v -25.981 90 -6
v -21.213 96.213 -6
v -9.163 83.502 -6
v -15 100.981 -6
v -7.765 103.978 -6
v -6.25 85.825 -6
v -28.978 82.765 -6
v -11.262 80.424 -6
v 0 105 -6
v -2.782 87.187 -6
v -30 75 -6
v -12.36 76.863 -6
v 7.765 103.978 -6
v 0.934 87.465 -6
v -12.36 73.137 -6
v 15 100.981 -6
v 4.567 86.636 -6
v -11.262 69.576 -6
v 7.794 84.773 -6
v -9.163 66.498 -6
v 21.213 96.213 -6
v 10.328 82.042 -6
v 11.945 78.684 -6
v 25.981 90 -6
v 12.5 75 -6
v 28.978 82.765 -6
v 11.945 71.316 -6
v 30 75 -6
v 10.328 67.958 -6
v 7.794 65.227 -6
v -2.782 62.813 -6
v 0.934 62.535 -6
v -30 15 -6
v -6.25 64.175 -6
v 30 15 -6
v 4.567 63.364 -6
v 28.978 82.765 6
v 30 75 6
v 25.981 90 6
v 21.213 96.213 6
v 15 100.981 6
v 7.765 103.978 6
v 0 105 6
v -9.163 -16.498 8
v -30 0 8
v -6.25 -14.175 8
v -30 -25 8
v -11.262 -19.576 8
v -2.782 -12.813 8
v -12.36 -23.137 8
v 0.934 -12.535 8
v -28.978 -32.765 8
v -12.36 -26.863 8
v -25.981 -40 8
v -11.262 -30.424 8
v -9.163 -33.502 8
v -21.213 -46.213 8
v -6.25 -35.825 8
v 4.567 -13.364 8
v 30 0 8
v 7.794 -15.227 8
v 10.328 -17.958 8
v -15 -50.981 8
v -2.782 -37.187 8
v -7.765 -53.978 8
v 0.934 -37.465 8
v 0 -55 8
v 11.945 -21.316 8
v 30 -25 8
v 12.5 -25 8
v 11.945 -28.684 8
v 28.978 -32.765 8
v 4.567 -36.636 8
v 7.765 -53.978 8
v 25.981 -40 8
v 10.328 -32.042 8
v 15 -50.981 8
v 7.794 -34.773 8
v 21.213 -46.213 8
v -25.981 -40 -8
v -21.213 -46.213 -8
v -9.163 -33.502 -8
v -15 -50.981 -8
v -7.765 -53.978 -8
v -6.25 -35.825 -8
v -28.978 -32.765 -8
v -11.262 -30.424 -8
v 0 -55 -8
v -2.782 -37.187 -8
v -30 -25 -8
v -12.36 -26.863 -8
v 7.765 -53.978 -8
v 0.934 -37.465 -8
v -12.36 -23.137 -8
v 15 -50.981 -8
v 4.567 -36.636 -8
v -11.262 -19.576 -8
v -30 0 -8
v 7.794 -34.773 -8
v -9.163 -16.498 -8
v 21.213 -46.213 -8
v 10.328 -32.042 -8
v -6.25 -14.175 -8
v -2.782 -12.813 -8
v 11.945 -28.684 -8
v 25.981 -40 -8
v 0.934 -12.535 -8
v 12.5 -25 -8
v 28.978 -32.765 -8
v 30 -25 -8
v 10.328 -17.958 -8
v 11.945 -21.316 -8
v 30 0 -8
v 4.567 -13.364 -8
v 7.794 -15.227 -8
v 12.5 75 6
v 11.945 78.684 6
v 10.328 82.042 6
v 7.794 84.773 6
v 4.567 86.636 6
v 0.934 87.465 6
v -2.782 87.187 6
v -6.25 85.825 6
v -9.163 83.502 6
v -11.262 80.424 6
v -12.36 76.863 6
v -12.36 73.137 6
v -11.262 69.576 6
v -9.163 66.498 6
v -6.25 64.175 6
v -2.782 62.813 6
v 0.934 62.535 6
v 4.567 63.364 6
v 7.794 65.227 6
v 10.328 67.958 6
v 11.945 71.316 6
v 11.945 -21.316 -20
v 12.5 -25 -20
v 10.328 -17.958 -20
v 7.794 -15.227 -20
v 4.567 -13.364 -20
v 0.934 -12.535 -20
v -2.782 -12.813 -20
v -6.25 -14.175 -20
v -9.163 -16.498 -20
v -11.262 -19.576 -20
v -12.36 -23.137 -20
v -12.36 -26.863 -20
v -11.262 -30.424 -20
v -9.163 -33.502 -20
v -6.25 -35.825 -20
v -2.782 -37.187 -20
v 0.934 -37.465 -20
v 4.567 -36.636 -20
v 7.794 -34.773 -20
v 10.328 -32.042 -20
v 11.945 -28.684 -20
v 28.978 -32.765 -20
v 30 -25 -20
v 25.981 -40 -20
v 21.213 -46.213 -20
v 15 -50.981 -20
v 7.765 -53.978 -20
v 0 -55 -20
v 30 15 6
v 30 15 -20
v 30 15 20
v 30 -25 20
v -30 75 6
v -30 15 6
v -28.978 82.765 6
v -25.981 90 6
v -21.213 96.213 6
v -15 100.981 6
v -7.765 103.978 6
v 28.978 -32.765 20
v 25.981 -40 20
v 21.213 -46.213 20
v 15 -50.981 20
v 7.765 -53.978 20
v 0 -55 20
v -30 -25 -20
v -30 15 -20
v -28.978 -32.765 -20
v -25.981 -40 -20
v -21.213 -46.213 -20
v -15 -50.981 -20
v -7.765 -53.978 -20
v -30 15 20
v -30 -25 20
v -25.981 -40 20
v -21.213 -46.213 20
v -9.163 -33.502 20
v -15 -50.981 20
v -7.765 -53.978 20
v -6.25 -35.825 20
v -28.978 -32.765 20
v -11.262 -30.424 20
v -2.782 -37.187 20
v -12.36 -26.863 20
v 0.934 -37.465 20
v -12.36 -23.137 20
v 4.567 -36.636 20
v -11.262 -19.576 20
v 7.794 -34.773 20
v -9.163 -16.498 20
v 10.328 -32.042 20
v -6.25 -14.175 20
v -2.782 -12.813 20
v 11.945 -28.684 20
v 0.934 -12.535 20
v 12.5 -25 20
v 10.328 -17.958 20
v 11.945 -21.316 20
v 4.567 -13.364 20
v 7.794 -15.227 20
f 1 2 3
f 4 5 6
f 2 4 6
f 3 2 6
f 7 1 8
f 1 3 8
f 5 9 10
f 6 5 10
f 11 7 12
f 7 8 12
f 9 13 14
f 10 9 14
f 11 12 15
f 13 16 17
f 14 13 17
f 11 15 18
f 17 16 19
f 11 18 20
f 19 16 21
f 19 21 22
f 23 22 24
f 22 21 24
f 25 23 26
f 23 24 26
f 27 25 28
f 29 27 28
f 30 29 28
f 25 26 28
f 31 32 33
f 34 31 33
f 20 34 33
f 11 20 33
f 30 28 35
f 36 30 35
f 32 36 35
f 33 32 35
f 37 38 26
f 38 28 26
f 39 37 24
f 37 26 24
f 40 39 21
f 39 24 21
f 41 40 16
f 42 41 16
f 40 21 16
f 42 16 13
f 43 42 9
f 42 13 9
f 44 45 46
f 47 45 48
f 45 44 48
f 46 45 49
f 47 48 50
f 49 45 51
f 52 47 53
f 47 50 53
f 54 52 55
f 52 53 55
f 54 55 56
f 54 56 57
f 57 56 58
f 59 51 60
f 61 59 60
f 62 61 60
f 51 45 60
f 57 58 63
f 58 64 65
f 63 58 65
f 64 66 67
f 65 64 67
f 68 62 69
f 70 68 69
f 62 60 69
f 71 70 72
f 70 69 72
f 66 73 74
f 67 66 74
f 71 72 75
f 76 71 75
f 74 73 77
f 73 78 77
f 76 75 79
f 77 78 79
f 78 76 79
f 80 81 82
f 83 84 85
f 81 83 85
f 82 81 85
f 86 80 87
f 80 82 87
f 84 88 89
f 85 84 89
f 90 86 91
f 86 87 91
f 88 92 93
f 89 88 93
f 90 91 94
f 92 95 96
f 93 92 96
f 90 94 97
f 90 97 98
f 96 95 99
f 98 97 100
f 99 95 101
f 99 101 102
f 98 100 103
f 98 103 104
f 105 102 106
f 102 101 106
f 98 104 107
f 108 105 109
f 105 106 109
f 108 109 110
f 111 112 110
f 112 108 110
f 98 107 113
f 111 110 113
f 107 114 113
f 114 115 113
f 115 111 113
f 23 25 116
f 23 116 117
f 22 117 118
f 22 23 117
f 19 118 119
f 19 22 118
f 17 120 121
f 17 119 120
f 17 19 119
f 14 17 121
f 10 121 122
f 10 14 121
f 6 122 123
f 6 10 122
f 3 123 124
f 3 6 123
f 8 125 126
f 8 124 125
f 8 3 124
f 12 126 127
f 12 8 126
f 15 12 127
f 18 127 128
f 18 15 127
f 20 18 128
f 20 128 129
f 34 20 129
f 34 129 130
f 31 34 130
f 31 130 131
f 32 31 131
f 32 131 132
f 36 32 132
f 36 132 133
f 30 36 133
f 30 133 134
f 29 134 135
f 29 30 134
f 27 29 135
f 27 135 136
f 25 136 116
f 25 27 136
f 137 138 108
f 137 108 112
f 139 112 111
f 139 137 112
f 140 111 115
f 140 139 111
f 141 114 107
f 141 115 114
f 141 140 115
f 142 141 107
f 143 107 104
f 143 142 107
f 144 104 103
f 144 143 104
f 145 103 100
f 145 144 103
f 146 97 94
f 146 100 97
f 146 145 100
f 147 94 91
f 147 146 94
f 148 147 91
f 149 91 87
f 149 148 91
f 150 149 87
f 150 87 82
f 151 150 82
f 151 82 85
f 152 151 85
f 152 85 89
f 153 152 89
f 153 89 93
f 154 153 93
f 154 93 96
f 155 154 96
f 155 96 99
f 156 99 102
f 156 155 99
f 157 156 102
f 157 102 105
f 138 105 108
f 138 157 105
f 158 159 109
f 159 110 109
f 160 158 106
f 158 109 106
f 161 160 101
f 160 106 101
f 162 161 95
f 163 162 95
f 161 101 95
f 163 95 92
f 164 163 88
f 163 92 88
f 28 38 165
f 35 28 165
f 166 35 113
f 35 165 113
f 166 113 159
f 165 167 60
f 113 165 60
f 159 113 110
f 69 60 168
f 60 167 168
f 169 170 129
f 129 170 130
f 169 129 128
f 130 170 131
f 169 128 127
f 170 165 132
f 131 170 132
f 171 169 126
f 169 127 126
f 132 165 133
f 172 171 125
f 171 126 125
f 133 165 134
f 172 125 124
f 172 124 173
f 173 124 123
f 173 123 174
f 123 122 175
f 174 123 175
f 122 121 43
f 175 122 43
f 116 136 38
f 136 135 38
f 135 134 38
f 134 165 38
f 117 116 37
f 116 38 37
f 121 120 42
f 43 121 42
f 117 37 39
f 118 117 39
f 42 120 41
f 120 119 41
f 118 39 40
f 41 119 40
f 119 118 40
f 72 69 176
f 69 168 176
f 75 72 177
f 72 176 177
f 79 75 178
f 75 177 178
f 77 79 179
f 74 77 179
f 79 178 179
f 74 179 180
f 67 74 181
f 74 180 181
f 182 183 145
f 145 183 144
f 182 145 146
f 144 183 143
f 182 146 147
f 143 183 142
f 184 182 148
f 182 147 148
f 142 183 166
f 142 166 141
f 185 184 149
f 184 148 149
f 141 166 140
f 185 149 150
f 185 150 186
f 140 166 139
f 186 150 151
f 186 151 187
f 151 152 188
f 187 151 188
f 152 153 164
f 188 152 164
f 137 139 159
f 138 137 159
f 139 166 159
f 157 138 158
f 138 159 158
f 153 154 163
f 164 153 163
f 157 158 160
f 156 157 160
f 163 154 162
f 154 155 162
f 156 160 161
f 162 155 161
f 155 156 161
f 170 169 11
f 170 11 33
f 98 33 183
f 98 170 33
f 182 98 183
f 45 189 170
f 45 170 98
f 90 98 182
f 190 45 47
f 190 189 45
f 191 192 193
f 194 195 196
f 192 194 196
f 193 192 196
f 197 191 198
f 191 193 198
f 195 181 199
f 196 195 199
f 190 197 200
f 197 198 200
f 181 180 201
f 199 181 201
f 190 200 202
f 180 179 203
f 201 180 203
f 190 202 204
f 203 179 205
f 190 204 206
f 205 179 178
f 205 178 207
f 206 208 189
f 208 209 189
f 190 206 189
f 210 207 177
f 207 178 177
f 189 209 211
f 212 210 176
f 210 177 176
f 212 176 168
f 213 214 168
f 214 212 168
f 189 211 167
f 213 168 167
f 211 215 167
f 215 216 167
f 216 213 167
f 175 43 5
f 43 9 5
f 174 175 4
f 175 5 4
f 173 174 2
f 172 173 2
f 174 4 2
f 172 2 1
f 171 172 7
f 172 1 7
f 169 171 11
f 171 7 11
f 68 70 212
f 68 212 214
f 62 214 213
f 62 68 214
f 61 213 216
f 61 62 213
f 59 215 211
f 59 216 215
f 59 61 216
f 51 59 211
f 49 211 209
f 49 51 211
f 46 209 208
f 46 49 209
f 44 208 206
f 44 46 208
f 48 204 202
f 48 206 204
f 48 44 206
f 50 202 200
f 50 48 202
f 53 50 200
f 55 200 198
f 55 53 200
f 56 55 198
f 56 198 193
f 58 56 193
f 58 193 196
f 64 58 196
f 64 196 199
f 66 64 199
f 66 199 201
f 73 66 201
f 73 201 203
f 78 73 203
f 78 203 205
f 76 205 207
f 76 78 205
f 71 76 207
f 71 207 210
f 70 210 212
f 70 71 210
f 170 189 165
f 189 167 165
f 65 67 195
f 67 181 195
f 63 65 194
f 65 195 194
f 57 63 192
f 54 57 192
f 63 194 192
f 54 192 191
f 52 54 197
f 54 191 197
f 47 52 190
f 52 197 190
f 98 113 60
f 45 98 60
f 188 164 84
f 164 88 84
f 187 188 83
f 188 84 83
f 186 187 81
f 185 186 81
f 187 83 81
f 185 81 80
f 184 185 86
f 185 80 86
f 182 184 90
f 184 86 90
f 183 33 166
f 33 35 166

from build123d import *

# Parameters (mm, degrees)
BOSS_EXTRUDE1_DEPTH     = 30
FILLET1_R               = 30
CUT_EXTRUDE1_DEPTH      = 117.297033496
CUT_EXTRUDE1_DEPTH_BACK = 117.297033496
SKETCH3_R               = 12.5


with BuildPart() as part:
    # Sketch1 → Boss-Extrude1 (new, symmetric)
    with BuildSketch(Plane.YZ):
        Polygon((0, -8), (0, 8), (-55, 8), (-55, 20), (15, 20), (15, 6), (105, 6), (105, -6), (15, -6), (15, -20), (-55, -20), (-55, -8), align=None)
    extrude(amount=BOSS_EXTRUDE1_DEPTH, both=True)

    # Fillet1
    fillet1_edges = [part.edges().sort_by_distance(p)[0] for p in [
        (-30, 105, 0),
        (30, 105, 0),
        (30, -55, -14),
        (-30, -55, -14),
        (-30, -55, 14),
        (30, -55, 14),
    ]]
    fillet(fillet1_edges, radius=FILLET1_R - 0.0001)  # a hair under: the kernel refuses the full size

    # Sketch3 → Cut-Extrude1 (cut, two sides: drawn at the far end of the back side and taken through both)
    with BuildSketch(Plane.XY.offset(20).offset(-CUT_EXTRUDE1_DEPTH_BACK)):
        with Locations((0, -25)):
            Circle(SKETCH3_R)
        with Locations((0, 75)):
            Circle(SKETCH3_R)
    extrude(amount=CUT_EXTRUDE1_DEPTH + CUT_EXTRUDE1_DEPTH_BACK, mode=Mode.SUBTRACT)


solid = part.part
